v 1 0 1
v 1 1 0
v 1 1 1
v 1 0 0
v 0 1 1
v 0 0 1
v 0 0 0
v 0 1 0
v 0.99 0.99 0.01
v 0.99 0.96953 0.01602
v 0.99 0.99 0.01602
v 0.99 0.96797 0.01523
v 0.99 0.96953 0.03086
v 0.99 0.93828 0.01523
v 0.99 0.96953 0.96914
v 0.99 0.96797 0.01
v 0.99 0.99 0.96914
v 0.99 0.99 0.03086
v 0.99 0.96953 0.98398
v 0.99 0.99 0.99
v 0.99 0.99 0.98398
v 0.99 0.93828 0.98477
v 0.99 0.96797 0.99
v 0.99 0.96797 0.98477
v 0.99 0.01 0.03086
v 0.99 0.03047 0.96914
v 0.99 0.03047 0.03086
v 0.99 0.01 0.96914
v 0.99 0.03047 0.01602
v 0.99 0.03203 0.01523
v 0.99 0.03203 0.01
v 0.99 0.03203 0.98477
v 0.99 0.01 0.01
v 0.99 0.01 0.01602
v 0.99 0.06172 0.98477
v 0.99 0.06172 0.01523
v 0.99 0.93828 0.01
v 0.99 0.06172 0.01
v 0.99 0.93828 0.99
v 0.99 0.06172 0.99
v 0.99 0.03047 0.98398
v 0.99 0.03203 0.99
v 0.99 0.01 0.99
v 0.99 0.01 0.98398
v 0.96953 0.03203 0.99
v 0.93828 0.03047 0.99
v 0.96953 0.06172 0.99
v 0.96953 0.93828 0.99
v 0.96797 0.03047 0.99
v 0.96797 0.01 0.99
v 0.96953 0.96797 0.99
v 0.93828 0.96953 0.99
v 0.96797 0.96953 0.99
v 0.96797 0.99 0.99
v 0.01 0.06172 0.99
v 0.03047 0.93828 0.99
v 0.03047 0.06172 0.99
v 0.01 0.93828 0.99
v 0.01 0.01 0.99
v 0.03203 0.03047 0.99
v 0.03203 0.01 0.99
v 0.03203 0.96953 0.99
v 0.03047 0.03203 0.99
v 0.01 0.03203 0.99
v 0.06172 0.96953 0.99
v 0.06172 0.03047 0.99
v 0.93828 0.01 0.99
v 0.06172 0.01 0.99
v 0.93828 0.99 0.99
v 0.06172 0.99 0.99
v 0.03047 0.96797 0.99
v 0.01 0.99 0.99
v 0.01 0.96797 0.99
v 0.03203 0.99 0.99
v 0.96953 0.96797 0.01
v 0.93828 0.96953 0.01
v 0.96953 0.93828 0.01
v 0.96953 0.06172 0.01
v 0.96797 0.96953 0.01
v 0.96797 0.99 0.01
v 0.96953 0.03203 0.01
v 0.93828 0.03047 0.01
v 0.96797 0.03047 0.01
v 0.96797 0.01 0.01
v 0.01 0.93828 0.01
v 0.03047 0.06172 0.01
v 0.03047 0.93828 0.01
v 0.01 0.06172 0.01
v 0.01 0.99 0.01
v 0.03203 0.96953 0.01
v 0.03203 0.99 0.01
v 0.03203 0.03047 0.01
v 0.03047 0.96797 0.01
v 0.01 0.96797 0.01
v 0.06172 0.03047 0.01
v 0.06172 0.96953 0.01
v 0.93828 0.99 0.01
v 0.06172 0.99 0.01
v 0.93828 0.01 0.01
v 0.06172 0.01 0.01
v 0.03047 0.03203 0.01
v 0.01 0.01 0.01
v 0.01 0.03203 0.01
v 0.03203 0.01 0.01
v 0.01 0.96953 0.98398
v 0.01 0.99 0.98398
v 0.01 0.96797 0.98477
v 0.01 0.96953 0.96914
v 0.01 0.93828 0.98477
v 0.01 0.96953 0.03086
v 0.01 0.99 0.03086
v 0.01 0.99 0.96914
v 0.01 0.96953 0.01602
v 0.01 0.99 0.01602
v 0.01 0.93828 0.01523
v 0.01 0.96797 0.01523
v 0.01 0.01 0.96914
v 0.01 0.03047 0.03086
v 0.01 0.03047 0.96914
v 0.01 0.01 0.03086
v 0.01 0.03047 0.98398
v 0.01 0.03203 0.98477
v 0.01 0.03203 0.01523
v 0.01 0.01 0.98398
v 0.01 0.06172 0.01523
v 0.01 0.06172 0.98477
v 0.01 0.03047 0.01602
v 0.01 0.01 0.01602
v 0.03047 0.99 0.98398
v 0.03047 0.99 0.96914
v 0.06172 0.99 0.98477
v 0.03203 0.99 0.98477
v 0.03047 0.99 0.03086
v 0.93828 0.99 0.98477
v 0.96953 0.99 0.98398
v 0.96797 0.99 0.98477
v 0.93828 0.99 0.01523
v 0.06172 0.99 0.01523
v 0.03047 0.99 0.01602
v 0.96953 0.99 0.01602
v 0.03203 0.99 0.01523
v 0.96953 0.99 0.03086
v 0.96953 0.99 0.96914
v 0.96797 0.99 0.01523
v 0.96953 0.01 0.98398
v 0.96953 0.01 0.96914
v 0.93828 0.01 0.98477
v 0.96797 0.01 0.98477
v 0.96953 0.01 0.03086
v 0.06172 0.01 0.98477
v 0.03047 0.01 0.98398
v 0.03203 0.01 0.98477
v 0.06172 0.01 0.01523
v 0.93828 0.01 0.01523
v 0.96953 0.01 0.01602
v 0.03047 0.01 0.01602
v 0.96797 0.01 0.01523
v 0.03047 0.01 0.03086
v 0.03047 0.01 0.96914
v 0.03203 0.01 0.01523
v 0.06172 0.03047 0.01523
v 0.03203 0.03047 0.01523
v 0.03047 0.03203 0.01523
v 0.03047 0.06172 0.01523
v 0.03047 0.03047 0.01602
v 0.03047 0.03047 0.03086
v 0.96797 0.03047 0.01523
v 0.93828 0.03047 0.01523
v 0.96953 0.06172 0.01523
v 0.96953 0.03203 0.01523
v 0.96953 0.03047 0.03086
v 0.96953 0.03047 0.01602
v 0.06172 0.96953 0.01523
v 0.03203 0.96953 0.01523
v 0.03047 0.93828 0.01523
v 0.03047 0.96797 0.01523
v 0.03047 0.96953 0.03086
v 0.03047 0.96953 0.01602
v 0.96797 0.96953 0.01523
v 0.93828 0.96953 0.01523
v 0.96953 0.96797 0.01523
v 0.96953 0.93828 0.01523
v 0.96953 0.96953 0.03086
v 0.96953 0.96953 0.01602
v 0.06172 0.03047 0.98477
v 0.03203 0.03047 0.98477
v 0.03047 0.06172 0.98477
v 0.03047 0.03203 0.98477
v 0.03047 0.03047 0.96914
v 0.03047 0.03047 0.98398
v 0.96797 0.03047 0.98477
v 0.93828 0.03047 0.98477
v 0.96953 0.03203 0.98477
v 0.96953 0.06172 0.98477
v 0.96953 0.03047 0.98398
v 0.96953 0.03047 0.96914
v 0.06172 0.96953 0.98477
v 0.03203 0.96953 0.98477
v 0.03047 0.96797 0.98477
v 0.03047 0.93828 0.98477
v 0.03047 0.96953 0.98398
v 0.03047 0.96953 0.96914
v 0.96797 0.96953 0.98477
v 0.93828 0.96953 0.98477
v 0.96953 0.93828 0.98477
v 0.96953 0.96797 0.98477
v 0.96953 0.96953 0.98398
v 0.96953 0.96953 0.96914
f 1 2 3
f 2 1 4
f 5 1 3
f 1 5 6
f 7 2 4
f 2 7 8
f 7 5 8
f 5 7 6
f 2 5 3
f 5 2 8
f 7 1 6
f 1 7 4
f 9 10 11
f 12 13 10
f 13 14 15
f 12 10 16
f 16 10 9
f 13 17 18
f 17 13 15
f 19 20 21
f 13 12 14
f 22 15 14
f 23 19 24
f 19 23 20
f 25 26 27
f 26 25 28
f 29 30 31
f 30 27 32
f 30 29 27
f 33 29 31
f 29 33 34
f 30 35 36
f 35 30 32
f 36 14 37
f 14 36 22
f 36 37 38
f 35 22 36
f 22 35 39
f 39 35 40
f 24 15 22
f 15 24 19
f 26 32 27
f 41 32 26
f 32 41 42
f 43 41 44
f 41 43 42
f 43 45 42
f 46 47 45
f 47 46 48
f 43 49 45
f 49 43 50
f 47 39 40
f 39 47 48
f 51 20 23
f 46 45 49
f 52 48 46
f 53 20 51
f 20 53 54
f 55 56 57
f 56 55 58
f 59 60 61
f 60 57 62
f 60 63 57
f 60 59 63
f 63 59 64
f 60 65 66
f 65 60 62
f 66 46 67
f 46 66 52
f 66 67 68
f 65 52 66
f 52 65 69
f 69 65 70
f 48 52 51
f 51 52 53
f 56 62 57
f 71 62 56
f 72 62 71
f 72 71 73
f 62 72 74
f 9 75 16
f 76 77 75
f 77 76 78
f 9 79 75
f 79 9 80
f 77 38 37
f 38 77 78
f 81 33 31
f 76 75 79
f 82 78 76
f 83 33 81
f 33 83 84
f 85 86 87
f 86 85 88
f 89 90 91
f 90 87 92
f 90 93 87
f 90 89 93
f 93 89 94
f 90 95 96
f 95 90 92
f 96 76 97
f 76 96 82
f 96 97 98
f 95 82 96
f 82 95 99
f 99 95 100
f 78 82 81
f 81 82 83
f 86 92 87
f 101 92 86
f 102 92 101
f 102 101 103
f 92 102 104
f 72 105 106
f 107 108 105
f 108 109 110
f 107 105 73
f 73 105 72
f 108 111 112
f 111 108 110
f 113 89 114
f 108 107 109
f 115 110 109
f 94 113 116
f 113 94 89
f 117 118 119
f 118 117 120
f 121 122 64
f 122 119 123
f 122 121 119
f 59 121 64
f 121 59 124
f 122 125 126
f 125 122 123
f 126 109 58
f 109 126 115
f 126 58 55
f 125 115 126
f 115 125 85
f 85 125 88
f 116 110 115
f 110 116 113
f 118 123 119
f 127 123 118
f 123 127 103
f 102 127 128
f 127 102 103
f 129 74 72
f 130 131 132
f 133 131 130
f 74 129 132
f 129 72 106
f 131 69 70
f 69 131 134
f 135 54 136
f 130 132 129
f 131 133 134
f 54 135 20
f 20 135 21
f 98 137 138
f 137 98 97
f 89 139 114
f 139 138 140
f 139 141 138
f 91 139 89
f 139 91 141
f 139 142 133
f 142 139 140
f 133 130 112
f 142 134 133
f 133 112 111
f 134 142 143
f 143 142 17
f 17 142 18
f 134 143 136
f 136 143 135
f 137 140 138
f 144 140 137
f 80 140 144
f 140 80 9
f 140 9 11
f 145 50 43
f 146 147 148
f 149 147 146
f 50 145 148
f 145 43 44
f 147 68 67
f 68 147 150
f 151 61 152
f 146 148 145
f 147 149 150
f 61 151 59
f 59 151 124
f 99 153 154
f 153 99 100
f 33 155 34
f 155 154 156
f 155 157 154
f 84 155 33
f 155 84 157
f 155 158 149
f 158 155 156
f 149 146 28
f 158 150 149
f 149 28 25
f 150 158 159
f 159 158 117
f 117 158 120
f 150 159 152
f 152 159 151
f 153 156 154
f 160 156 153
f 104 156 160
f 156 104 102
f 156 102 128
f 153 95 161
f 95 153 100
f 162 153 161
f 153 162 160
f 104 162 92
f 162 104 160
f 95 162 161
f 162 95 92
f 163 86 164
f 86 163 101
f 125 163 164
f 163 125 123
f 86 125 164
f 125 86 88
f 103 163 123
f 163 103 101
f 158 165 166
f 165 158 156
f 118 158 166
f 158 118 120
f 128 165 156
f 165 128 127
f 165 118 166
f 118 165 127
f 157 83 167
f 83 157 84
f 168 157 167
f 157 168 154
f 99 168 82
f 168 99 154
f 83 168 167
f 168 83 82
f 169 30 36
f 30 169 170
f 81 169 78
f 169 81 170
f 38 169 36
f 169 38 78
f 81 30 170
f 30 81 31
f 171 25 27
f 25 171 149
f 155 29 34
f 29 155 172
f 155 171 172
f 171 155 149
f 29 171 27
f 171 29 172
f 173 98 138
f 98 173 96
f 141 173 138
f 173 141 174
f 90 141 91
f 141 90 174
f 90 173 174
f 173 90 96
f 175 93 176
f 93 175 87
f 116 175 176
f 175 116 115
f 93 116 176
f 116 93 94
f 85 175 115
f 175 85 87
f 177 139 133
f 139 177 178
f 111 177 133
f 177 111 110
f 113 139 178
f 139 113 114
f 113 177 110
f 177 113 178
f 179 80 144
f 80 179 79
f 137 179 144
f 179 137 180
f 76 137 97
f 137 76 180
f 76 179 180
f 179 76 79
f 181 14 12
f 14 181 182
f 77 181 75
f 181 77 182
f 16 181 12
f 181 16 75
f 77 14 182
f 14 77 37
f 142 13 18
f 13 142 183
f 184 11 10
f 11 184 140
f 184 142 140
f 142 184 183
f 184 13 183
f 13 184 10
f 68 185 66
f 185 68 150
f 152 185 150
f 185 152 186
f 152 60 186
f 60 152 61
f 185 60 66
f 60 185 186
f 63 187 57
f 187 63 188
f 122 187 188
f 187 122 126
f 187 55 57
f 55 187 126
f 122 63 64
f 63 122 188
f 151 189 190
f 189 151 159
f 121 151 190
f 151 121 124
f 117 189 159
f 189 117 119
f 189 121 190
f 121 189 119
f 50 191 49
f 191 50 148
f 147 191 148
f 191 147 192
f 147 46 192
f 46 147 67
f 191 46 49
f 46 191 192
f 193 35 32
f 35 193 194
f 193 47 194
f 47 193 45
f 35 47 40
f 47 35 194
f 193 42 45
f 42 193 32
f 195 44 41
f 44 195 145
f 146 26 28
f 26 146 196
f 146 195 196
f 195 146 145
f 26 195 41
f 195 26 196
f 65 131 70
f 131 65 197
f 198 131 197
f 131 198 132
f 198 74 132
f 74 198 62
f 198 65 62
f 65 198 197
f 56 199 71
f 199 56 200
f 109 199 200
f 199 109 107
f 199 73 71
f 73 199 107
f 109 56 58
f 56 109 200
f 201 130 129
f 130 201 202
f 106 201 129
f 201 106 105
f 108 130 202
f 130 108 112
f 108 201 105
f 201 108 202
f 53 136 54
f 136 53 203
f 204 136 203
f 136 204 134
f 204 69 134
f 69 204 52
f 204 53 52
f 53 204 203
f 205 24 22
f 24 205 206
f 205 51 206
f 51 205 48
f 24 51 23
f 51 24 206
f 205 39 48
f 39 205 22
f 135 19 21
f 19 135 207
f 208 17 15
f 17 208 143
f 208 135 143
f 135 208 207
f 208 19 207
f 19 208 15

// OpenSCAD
translate([0.046875, 0.015625, 0.0078125]) color([0.7496523094784379, 0.698979968590827, 0.8137974970319007]) cube([0.0296875, 0.0296875, 0.01484375], center=true);
translate([0.015625, 0.046875, 0.0078125]) color([0.2900989154375855, 0.4799983707352583, 0.7775393964930869]) cube([0.0296875, 0.0296875, 0.01484375], center=true);
translate([0.015625, 0.015625, 0.0234375]) color([0.9388082122897282, 0.038854283444424764, 0.9925655674013534]) cube([0.0296875, 0.0296875, 0.01484375], center=true);
translate([0.953125, 0.015625, 0.0078125]) color([0.44170260534215255, 0.5087868714146372, 0.3598719796518973]) cube([0.0296875, 0.0296875, 0.01484375], center=true);
translate([0.984375, 0.046875, 0.0078125]) color([0.18460354523301148, 0.44970120413659875, 0.6501993296624843]) cube([0.0296875, 0.0296875, 0.01484375], center=true);
translate([0.984375, 0.015625, 0.0234375]) color([0.3403487699834433, 0.7817731397512809, 0.9743292711922114]) cube([0.0296875, 0.0296875, 0.01484375], center=true);
translate([0.046875, 0.984375, 0.0078125]) color([0.5879067123776442, 0.7644126763156446, 0.4000601250473008]) cube([0.0296875, 0.0296875, 0.01484375], center=true);
translate([0.015625, 0.953125, 0.0078125]) color([0.36604355066630223, 0.49574653220142006, 0.2571489256046471]) cube([0.0296875, 0.0296875, 0.01484375], center=true);
translate([0.015625, 0.984375, 0.0234375]) color([0.8374632643388946, 0.9805052880896761, 0.7293080884755028]) cube([0.0296875, 0.0296875, 0.01484375], center=true);
translate([0.953125, 0.984375, 0.0078125]) color([0.7102462781470706, 0.33116367429719706, 0.8694016796882821]) cube([0.0296875, 0.0296875, 0.01484375], center=true);
translate([0.984375, 0.953125, 0.0078125]) color([0.15926942089300955, 0.6020328264740608, 0.3939291367673188]) cube([0.0296875, 0.0296875, 0.01484375], center=true);
translate([0.984375, 0.984375, 0.0234375]) color([0.17107948370632353, 0.5511468417605202, 0.6362547263976265]) cube([0.0296875, 0.0296875, 0.01484375], center=true);
translate([0.046875, 0.015625, 0.9921875]) color([0.4513488113702364, 0.4273913195858777, 0.7941595965619336]) cube([0.0296875, 0.0296875, 0.01484375], center=true);
translate([0.015625, 0.046875, 0.9921875]) color([0.250259319804494, 0.668466334841109, 0.9558425975622227]) cube([0.0296875, 0.0296875, 0.01484375], center=true);
translate([0.015625, 0.015625, 0.9765625]) color([0.8787840809996866, 0.7297949922477387, 0.6760701789099856]) cube([0.0296875, 0.0296875, 0.01484375], center=true);
translate([0.953125, 0.015625, 0.9921875]) color([0.12178286062576871, 0.34347709882143906, 0.3138882056823582]) cube([0.0296875, 0.0296875, 0.01484375], center=true);
translate([0.984375, 0.046875, 0.9921875]) color([0.8256958180770725, 0.5497988063064695, 0.5224418814286286]) cube([0.0296875, 0.0296875, 0.01484375], center=true);
translate([0.984375, 0.015625, 0.9765625]) color([0.8667571418796679, 0.1657379622209173, 0.34152302129198175]) cube([0.0296875, 0.0296875, 0.01484375], center=true);
translate([0.046875, 0.984375, 0.9921875]) color([0.4966795782970417, 0.4682540107735893, 0.7143441099210599]) cube([0.0296875, 0.0296875, 0.01484375], center=true);
translate([0.015625, 0.953125, 0.9921875]) color([0.6794769624286241, 0.9778011538649698, 0.6956985505223239]) cube([0.0296875, 0.0296875, 0.01484375], center=true);
translate([0.015625, 0.984375, 0.9765625]) color([0.049848449837082254, 0.7040255102812552, 0.23502660225710548]) cube([0.0296875, 0.0296875, 0.01484375], center=true);
translate([0.953125, 0.984375, 0.9921875]) color([0.2192232268137776, 0.25394565558833193, 0.7470066807227207]) cube([0.0296875, 0.0296875, 0.01484375], center=true);
translate([0.984375, 0.953125, 0.9921875]) color([0.4970273434949305, 0.6457861570741659, 0.6123610041545314]) cube([0.0296875, 0.0296875, 0.01484375], center=true);
translate([0.984375, 0.984375, 0.9765625]) color([0.3147608560008942, 0.21779972321877228, 0.08573673877399712]) cube([0.0296875, 0.0296875, 0.01484375], center=true);
color([0.3,0.3,0.3,0.3]) difference() { cube([1,1,1]); translate([0.01,0.01,0.01]) cube([0.98,0.98,0.98]); }
